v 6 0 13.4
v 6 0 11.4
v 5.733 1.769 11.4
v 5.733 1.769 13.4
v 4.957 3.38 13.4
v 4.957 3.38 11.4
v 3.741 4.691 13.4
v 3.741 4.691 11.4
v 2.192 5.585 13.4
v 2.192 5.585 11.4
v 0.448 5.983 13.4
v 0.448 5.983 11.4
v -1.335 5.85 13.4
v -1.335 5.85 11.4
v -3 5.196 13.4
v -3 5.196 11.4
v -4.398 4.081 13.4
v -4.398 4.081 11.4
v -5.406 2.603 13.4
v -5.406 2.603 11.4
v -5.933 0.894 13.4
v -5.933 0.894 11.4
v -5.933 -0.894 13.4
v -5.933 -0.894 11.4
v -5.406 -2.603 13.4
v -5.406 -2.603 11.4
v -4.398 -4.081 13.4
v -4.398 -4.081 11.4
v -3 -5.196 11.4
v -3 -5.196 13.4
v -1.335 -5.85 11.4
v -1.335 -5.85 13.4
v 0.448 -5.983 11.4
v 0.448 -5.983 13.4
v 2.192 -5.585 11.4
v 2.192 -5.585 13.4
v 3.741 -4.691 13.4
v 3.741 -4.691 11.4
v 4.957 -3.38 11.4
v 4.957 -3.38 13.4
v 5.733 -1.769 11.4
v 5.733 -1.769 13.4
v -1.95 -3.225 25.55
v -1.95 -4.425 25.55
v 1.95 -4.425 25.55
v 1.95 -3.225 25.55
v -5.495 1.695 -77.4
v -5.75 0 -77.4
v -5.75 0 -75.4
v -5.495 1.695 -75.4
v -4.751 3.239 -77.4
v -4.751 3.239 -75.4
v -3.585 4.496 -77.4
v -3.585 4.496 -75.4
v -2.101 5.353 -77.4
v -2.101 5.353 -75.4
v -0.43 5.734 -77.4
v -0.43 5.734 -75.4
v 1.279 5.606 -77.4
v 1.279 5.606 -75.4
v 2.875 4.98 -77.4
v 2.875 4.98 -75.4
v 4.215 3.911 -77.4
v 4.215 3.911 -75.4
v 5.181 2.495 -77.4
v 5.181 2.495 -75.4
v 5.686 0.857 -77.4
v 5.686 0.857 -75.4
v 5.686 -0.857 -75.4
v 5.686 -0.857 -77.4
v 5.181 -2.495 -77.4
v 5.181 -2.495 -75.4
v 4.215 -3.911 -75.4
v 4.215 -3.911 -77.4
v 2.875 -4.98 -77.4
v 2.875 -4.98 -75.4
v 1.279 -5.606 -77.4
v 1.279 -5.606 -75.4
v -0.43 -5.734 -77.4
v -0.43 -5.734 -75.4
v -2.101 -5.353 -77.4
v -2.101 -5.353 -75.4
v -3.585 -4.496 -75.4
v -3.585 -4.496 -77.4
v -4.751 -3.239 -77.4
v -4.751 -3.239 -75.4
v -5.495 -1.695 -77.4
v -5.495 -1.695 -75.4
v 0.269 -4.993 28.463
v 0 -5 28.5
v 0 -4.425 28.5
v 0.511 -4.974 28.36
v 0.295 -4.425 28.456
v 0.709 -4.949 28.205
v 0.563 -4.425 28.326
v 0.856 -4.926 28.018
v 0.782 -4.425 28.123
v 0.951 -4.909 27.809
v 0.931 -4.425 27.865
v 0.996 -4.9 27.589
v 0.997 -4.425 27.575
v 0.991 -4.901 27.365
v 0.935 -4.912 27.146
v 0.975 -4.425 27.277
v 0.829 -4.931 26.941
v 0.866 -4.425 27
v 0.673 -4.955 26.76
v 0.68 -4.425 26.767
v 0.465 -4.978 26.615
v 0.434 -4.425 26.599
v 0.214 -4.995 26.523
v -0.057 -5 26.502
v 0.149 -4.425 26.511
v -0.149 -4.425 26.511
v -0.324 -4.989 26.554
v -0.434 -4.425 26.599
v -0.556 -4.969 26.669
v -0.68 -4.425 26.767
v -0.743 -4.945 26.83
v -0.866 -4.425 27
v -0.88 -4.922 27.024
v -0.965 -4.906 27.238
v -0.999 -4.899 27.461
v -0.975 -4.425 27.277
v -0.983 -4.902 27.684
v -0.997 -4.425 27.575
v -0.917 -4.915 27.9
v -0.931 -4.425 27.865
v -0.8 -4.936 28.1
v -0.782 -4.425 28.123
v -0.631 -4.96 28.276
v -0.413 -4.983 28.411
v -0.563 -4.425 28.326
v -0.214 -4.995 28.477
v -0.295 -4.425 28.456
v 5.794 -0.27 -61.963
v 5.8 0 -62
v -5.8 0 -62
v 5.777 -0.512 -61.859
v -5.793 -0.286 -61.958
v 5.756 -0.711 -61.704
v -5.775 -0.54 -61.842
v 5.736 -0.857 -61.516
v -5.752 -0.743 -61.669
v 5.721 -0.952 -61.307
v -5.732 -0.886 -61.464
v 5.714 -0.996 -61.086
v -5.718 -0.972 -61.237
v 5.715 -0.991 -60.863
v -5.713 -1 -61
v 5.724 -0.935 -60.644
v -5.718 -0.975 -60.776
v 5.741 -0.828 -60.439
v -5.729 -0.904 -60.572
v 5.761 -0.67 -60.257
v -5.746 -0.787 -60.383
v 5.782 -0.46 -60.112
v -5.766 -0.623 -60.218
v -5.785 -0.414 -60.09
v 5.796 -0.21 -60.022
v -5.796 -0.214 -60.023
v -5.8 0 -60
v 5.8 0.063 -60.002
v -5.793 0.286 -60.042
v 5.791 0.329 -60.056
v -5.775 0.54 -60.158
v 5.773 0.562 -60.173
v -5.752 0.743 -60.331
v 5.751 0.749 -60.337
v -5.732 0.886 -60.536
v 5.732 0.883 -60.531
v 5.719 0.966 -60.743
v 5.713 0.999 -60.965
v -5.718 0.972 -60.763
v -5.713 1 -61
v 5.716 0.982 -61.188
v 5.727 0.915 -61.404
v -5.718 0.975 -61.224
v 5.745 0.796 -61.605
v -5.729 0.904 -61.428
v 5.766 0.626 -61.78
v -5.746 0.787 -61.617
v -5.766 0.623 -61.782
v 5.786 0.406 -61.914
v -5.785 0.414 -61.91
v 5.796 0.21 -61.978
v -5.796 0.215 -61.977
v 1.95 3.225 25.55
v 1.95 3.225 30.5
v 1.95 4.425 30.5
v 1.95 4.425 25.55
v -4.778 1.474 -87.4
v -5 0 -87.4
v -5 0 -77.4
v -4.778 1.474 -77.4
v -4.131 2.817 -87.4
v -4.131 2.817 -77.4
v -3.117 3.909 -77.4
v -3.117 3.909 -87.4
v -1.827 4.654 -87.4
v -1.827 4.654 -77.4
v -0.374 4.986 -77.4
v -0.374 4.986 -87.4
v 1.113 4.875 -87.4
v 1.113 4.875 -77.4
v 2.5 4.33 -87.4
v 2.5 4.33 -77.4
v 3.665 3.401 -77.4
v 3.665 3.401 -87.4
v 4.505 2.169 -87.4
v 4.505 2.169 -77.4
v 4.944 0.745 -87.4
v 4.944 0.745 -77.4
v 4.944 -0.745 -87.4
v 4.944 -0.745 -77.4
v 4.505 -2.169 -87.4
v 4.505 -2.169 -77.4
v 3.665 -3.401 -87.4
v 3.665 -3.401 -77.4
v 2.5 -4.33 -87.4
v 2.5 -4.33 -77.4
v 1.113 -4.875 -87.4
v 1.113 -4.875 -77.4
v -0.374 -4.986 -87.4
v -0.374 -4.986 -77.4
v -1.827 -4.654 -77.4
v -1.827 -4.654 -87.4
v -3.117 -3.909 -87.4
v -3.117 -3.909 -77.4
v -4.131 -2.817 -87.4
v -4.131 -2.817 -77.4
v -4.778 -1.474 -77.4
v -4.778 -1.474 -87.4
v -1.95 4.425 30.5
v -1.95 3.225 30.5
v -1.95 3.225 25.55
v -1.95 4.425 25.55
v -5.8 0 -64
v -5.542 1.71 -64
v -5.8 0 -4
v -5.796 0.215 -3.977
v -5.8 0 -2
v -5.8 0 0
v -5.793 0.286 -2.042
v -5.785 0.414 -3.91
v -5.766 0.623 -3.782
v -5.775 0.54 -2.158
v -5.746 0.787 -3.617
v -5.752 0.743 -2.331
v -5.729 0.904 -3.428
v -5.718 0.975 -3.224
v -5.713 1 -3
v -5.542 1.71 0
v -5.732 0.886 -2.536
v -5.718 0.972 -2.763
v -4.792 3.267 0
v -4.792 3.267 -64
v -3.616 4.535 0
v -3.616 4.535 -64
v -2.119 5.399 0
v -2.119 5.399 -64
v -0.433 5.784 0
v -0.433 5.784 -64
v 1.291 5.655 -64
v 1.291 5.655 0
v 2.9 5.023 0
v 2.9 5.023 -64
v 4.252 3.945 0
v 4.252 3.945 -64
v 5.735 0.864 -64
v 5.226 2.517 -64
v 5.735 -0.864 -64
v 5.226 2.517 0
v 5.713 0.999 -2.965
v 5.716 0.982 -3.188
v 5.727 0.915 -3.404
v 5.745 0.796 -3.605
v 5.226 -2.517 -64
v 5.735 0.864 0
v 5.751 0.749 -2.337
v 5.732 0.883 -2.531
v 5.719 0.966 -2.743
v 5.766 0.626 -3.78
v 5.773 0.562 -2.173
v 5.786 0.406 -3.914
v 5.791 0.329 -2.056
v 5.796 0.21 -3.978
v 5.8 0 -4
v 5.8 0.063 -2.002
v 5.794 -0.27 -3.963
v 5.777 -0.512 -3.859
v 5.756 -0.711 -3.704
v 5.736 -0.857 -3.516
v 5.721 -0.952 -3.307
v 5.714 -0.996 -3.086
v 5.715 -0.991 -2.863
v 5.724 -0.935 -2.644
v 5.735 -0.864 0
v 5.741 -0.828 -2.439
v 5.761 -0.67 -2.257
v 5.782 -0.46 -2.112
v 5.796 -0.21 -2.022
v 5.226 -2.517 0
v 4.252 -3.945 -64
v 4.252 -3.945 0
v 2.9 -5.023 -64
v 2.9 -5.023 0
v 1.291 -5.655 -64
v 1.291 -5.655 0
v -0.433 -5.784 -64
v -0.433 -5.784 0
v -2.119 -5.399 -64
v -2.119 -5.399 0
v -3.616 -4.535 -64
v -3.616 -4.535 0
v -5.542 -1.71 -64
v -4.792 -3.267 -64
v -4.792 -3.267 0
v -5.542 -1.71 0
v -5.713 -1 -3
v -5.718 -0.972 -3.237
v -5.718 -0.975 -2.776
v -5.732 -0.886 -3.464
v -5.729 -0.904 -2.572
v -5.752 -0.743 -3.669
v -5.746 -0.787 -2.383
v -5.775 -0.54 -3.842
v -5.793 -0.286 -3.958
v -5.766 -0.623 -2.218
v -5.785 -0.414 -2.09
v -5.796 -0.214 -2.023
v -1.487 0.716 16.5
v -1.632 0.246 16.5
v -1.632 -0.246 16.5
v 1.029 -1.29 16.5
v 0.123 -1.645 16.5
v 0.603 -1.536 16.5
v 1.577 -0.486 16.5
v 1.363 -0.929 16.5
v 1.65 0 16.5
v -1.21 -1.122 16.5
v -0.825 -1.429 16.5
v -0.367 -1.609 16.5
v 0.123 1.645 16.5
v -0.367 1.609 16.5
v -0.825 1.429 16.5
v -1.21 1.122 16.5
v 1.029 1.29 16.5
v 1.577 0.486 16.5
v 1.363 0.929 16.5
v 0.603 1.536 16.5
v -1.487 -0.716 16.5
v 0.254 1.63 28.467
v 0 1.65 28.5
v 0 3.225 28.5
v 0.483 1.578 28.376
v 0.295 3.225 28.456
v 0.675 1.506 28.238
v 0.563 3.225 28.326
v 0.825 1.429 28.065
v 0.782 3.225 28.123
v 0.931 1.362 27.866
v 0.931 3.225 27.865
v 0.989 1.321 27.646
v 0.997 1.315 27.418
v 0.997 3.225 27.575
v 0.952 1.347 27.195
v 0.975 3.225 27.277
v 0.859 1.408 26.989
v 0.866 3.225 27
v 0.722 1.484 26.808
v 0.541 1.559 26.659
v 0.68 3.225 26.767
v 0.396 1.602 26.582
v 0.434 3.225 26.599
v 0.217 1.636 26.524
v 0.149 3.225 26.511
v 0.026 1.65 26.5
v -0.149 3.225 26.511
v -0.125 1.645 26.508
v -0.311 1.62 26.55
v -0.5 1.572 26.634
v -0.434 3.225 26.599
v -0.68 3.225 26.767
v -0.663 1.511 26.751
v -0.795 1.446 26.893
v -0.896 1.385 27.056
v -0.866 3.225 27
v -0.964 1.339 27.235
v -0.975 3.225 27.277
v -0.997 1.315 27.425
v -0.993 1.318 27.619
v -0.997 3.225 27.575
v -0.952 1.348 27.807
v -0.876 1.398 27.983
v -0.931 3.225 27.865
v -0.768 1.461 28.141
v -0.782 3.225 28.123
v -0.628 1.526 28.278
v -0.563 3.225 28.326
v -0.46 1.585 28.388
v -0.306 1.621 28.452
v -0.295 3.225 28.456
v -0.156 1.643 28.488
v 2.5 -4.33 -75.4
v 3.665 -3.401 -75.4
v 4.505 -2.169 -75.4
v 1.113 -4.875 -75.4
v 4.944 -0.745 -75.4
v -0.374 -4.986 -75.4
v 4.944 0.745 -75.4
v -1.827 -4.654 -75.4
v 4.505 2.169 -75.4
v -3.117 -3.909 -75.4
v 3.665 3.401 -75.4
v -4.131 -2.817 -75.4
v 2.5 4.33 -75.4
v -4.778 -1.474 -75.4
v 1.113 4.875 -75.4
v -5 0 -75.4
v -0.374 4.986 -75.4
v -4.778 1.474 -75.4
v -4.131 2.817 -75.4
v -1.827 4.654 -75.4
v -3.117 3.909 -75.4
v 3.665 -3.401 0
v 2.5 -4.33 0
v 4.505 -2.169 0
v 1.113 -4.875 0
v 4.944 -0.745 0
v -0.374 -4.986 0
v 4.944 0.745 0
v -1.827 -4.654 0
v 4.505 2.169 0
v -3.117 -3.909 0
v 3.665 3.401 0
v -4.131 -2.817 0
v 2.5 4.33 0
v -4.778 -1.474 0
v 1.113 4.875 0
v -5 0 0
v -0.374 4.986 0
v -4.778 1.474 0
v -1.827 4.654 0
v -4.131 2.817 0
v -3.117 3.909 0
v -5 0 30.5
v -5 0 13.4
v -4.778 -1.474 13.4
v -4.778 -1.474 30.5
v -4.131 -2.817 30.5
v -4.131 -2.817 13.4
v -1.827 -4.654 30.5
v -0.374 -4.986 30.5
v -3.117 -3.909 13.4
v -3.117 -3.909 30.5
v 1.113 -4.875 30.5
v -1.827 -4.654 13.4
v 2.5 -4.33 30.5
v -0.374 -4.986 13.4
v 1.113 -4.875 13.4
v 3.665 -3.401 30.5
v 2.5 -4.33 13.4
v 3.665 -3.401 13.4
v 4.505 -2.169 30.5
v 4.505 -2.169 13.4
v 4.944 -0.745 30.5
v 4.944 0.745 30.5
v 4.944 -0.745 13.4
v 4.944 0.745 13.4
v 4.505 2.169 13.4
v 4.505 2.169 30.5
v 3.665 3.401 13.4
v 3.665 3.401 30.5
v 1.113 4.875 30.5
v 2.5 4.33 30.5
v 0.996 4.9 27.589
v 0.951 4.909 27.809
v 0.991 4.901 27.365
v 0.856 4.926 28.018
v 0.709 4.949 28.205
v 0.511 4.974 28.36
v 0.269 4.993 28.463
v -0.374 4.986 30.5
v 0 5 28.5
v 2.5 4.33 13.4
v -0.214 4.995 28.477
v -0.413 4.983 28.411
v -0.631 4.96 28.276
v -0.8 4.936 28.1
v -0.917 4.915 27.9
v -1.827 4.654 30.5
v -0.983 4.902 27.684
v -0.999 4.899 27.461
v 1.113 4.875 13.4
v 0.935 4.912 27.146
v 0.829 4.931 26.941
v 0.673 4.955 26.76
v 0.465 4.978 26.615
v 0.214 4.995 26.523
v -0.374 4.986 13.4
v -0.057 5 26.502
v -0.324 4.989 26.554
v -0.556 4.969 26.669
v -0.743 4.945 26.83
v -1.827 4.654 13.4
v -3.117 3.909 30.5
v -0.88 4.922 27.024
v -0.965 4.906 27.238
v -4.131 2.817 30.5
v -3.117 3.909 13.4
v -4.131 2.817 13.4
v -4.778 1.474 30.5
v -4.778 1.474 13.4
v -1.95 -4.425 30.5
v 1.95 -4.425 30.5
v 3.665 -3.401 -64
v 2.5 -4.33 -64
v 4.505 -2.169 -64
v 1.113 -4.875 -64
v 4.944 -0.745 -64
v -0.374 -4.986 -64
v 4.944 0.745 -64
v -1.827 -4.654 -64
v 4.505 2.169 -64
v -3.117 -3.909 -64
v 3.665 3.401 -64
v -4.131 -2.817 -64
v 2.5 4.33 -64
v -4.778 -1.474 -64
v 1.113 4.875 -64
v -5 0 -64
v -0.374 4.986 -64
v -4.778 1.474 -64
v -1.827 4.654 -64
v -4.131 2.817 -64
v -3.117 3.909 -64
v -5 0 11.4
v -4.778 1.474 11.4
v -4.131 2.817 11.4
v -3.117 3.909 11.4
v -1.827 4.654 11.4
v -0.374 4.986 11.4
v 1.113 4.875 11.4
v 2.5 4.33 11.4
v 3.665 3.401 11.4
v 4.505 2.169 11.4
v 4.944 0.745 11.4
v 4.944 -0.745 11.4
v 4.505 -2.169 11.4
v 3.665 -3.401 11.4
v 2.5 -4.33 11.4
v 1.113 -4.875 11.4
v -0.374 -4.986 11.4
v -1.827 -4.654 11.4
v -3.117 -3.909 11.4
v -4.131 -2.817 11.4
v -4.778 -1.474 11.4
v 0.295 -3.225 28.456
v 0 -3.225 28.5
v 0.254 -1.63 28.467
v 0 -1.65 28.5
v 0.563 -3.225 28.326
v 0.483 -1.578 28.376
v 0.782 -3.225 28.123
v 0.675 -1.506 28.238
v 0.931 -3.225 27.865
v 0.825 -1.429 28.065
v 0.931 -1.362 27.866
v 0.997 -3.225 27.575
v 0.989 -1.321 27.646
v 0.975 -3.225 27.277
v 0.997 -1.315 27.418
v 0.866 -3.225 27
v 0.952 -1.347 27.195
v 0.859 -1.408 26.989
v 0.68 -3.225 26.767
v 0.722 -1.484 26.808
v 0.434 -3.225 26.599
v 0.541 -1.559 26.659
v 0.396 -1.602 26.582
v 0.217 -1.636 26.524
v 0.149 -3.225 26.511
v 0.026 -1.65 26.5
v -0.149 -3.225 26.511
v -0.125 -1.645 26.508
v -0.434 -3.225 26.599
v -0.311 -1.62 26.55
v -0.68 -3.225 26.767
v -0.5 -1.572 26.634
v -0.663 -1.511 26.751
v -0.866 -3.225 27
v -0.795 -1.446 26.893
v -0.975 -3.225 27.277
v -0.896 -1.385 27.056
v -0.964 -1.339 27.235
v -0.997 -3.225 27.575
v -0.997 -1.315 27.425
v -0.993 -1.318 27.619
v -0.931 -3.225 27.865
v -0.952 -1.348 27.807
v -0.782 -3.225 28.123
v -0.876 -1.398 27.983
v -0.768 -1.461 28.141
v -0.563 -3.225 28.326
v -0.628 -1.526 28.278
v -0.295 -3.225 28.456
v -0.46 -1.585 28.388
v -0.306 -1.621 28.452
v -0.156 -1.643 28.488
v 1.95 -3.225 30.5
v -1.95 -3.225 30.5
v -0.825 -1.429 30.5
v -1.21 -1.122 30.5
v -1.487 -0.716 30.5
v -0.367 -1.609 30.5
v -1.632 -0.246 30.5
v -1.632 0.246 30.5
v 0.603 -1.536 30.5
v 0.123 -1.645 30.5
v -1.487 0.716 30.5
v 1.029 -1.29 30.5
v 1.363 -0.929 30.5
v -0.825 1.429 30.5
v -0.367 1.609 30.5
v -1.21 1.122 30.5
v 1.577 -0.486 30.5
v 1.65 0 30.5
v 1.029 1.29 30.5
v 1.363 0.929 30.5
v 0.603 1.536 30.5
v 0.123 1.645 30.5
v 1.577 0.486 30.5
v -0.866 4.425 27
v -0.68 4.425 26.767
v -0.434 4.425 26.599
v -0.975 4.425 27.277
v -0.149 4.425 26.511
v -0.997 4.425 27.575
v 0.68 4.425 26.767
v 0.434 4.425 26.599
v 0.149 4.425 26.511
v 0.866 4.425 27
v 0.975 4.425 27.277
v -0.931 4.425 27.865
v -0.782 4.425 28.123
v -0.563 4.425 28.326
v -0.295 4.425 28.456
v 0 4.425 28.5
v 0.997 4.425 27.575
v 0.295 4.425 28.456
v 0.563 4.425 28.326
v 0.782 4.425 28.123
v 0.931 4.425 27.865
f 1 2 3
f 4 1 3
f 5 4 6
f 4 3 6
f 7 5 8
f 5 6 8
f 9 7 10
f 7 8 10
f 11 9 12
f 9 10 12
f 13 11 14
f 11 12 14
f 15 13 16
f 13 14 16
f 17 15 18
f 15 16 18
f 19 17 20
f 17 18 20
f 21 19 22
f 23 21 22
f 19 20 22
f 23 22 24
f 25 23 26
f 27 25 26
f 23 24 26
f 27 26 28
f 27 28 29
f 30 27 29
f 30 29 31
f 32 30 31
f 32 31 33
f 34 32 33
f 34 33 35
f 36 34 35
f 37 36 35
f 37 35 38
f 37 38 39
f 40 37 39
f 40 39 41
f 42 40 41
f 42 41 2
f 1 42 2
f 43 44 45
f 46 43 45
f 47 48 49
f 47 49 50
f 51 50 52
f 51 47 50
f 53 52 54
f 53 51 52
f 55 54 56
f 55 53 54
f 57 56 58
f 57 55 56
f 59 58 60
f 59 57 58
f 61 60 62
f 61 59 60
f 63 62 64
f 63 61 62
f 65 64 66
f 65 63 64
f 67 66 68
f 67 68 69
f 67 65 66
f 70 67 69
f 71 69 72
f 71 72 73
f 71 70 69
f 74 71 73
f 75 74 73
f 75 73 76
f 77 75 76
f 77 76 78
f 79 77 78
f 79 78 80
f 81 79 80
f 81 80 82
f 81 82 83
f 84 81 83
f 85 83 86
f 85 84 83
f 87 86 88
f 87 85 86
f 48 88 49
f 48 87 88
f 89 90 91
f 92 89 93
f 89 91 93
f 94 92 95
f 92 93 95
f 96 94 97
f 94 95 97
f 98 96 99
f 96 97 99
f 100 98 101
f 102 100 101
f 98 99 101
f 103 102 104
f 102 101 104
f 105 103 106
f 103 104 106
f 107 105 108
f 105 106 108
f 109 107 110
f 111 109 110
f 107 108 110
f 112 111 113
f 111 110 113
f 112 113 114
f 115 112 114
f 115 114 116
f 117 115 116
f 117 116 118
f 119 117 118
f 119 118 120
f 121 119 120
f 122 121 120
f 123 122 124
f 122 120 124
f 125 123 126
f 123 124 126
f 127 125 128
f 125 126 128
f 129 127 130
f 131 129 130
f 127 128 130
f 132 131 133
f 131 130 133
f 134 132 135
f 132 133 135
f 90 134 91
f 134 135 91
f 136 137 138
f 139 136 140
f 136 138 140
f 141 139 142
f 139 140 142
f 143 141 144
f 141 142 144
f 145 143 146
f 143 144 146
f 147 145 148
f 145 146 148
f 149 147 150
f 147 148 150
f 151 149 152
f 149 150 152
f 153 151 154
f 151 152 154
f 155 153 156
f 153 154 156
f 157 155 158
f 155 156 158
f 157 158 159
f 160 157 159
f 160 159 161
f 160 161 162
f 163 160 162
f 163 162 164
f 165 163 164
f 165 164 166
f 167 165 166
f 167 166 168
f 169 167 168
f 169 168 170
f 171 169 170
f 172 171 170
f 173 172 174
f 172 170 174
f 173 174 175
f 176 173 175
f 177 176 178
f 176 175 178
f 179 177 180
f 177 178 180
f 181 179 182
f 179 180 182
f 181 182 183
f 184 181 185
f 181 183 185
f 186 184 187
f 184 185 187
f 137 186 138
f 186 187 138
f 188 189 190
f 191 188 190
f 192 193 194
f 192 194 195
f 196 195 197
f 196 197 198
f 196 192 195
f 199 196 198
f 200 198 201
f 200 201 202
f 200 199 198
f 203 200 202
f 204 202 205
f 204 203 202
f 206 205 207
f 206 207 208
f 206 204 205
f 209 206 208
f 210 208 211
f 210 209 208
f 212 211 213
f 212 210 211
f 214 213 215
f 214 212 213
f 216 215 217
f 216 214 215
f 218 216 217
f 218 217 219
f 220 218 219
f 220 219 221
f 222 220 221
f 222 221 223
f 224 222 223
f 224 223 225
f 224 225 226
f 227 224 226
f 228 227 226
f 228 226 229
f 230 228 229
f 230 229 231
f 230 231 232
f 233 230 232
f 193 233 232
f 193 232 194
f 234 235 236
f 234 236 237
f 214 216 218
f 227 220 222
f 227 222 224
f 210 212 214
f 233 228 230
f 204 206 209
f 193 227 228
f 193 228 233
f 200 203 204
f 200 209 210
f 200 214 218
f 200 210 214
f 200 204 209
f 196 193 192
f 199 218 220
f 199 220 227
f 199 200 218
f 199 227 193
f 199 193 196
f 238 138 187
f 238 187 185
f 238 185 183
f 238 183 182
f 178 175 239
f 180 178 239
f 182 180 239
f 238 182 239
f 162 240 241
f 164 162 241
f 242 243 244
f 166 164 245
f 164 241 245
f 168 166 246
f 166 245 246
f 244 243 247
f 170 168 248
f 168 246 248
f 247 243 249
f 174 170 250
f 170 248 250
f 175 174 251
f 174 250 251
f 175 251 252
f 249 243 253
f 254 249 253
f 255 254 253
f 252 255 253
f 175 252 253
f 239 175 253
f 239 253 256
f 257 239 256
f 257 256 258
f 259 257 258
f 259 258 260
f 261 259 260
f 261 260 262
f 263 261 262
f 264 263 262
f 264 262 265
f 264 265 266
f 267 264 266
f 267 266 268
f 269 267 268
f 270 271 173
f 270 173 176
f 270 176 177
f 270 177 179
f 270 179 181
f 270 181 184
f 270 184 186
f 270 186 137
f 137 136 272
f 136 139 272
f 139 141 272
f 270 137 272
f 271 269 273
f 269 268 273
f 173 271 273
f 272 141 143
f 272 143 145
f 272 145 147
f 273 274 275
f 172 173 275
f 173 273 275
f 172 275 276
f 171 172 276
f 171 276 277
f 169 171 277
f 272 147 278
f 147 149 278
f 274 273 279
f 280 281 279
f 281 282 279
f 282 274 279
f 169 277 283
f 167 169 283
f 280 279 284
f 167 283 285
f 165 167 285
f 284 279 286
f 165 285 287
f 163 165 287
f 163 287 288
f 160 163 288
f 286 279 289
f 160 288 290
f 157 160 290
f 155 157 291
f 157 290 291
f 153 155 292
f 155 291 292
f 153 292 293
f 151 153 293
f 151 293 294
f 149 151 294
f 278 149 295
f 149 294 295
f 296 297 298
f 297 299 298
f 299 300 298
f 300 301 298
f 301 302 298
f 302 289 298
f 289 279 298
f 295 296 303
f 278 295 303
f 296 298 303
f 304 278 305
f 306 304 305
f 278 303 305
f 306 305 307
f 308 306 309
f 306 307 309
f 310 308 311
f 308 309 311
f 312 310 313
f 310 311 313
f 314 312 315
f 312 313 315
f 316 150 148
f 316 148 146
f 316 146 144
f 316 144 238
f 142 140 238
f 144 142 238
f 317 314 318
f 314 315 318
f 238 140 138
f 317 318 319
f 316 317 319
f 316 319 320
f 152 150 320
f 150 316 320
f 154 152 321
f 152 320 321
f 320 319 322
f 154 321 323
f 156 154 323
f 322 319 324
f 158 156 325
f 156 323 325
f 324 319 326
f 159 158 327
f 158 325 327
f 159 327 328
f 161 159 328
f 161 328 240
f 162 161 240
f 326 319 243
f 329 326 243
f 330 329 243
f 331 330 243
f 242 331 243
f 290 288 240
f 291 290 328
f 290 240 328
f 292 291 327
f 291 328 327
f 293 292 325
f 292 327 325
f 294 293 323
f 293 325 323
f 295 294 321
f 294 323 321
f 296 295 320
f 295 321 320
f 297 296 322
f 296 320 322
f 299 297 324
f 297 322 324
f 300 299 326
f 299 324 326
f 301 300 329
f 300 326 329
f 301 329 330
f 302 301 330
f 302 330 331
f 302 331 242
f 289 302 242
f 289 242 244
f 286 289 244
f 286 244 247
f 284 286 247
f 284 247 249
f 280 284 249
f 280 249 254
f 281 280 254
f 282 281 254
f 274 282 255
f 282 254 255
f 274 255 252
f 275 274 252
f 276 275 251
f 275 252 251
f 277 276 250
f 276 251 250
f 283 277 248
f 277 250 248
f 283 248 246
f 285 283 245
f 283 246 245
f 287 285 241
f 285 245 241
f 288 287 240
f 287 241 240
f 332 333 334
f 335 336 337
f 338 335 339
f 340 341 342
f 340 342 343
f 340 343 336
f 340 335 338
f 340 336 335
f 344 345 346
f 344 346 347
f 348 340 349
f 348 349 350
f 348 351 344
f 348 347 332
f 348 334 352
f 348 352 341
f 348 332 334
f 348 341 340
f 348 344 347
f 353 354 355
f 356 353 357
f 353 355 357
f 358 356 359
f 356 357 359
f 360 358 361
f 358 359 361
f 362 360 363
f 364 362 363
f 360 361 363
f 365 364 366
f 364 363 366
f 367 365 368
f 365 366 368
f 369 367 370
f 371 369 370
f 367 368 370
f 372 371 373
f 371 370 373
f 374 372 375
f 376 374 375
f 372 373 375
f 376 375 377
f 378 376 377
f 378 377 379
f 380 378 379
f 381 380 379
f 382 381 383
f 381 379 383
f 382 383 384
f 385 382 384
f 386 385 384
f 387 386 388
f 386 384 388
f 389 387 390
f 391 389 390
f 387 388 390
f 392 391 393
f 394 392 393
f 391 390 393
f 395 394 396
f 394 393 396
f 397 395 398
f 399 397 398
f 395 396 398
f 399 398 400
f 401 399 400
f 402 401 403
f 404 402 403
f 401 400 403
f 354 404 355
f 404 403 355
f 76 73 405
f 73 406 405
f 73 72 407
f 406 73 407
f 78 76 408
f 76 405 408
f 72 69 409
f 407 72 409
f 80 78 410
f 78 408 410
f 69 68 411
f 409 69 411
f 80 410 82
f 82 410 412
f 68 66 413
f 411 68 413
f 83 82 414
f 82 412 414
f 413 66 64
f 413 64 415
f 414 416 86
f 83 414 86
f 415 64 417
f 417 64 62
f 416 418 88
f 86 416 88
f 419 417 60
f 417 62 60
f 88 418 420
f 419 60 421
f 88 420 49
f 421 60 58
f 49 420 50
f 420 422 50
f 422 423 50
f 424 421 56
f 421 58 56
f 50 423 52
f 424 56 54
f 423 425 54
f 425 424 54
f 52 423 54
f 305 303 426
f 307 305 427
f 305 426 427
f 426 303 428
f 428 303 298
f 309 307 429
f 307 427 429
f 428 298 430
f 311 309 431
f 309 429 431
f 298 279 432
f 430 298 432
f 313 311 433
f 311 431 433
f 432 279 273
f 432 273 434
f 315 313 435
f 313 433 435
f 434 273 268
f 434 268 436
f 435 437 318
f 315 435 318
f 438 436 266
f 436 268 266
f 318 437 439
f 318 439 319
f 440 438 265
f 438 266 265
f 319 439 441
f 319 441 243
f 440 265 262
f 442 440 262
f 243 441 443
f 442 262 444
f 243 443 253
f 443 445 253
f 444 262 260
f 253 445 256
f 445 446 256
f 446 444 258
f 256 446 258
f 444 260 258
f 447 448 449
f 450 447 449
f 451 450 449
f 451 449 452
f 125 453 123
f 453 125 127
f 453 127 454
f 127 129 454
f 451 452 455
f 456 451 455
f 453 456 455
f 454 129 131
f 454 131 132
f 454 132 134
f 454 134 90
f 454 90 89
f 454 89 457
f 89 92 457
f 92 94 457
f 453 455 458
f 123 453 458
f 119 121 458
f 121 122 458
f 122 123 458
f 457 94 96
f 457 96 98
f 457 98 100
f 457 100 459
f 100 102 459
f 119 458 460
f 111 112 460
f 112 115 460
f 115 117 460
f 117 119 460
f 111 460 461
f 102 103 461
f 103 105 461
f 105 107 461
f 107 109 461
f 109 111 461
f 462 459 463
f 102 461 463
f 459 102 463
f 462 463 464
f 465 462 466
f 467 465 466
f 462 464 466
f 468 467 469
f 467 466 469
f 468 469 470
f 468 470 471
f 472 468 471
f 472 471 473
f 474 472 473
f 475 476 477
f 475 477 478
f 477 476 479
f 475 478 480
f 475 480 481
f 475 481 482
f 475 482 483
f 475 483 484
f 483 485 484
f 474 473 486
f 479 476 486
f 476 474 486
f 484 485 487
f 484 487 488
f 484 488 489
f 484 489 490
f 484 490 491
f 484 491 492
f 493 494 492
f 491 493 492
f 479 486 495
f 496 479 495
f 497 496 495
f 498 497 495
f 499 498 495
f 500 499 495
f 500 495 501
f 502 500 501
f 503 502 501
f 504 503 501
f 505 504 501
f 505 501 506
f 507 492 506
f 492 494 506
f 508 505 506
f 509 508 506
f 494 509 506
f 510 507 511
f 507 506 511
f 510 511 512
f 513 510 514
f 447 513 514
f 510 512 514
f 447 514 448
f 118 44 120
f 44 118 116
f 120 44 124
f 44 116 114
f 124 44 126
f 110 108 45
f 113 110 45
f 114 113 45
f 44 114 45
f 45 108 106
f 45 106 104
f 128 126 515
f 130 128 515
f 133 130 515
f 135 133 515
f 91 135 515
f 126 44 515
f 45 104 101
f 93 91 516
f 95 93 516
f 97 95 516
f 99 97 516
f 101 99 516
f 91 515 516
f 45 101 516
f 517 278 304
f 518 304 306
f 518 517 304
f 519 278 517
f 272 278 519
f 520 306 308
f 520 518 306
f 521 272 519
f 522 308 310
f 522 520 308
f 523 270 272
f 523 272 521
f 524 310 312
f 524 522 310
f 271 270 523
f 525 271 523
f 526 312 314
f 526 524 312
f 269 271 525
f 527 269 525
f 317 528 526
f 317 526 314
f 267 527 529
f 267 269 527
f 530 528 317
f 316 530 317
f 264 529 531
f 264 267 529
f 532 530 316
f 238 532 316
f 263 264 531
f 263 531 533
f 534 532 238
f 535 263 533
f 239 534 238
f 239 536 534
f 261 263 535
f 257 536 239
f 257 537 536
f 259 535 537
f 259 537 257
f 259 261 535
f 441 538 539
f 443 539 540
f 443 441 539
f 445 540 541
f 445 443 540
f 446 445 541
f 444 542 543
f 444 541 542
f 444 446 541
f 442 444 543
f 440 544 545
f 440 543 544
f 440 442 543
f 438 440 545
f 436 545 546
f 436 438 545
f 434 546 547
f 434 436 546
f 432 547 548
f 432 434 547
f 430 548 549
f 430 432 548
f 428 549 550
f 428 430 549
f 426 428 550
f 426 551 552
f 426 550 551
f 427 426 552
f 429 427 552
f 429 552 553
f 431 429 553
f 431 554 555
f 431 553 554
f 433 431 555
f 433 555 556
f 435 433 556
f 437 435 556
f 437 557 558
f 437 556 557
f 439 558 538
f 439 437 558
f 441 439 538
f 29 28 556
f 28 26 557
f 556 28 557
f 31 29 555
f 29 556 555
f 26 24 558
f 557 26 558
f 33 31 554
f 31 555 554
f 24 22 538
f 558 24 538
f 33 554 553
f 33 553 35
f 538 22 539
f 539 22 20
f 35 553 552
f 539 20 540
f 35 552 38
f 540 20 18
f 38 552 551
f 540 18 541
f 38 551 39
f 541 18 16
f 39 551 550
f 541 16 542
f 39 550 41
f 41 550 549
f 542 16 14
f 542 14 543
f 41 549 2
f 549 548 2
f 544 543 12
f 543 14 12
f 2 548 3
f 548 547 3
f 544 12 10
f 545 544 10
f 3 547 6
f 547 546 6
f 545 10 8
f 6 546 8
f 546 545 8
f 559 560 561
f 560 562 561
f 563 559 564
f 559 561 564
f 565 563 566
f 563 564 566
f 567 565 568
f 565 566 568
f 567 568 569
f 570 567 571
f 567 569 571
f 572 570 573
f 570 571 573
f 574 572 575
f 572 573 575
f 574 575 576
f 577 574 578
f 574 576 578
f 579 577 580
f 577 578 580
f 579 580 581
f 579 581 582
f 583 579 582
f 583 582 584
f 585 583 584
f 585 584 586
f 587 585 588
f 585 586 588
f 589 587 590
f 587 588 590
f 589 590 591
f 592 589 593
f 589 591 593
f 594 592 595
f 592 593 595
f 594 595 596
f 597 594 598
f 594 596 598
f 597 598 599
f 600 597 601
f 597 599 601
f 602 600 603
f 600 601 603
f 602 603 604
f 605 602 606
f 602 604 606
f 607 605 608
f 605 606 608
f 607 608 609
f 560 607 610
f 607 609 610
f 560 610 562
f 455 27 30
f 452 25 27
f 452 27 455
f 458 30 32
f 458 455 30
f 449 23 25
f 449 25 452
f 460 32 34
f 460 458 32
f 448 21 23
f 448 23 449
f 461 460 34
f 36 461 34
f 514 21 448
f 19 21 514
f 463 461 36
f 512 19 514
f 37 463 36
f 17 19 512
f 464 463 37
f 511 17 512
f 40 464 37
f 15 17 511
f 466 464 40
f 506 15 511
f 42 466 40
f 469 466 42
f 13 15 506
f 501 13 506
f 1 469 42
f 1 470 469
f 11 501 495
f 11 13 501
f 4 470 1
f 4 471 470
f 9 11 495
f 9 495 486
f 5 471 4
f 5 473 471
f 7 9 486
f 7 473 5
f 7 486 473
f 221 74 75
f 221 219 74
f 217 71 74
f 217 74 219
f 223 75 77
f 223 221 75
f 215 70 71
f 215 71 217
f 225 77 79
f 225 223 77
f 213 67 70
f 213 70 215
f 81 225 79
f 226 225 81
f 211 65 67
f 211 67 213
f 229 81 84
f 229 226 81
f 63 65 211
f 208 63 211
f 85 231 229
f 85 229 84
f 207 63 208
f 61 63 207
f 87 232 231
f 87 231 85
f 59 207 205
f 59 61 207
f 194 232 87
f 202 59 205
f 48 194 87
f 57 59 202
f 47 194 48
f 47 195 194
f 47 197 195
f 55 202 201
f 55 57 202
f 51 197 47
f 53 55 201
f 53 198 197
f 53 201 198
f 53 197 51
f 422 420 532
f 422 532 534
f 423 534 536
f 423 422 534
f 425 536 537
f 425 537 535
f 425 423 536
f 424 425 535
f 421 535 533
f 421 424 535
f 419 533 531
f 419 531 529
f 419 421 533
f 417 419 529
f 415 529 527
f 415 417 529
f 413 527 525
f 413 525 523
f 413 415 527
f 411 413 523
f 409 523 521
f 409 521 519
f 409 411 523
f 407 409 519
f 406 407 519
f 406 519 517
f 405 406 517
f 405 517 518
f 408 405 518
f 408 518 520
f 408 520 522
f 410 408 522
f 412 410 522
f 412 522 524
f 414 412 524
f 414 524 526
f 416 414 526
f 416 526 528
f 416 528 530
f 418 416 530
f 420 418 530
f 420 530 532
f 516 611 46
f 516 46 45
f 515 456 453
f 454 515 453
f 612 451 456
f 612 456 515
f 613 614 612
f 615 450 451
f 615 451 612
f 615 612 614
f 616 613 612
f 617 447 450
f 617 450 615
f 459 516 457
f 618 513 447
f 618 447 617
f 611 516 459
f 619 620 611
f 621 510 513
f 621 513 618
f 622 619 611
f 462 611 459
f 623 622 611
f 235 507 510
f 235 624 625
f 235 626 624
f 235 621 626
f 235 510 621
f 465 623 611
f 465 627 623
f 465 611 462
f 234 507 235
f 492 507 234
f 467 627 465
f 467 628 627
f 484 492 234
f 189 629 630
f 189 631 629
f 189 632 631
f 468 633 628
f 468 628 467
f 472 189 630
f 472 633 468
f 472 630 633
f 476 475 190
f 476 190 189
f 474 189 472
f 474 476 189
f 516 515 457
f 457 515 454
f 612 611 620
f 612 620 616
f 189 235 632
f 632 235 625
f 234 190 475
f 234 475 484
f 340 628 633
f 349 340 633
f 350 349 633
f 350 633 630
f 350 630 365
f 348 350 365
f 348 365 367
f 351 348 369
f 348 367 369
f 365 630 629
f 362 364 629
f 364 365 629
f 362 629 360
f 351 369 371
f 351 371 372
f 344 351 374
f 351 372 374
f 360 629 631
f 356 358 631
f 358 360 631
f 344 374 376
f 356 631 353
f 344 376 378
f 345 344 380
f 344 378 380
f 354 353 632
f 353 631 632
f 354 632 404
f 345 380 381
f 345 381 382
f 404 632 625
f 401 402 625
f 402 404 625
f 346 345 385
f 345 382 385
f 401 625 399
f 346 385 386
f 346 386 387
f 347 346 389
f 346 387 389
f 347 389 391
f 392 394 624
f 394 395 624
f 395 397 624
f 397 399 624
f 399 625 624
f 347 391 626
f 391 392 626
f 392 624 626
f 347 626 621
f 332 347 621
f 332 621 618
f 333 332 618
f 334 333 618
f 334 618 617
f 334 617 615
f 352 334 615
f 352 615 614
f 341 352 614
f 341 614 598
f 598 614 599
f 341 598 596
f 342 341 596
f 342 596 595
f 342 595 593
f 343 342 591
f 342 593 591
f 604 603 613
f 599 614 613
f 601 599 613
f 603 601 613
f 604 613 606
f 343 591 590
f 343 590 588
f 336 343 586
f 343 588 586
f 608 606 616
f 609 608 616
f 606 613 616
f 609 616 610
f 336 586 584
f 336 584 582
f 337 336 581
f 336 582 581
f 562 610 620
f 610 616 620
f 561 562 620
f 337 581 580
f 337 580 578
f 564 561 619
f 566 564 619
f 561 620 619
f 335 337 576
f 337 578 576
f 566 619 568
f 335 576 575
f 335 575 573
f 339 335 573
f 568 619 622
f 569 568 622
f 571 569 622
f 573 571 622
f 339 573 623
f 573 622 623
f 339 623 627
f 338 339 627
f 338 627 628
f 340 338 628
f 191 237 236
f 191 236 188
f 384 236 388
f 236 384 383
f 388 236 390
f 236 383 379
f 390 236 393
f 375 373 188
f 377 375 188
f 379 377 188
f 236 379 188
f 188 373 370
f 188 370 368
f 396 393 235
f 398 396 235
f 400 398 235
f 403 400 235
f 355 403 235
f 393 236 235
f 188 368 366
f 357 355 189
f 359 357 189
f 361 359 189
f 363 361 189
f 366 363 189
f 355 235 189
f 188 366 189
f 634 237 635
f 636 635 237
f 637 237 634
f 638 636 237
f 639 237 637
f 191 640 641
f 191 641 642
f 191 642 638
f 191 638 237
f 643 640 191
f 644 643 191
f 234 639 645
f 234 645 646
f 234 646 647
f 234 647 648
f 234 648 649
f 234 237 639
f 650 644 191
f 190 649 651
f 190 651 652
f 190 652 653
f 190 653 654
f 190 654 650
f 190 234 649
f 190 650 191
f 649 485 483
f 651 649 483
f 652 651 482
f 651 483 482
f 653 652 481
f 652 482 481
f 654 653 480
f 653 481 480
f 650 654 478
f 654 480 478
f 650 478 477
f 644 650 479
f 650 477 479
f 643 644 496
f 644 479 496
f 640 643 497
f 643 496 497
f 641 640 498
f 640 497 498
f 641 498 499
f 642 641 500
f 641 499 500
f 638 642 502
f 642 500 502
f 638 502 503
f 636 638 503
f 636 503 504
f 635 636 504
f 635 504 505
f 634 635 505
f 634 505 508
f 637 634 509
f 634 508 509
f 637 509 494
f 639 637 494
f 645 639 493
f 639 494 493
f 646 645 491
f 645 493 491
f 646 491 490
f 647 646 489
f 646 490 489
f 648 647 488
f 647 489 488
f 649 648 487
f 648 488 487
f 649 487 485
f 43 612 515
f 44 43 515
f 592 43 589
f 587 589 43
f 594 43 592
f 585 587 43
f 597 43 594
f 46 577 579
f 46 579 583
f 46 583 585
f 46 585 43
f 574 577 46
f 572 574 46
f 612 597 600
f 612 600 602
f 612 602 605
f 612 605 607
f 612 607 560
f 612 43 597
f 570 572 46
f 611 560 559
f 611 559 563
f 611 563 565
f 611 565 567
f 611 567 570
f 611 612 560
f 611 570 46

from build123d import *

# Parameters (mm, degrees)
SKETCH1_R           = 6
BOSS_EXTRUDE1_DEPTH = 30.5
SKETCH2_R           = 1.65
CUT_EXTRUDE1_DEPTH  = 14
SKETCH13_W          = 3.9
SKETCH13_H          = 1.2
CUT_EXTRUDE6_DEPTH  = 4.95
SKETCH4_R           = 1
CUT_EXTRUDE7_DEPTH  = 7.5
SKETCH19_R          = 6
SKETCH19_R_2        = 5
CUT_EXTRUDE8_DEPTH  = 45
SKETCH21_R          = 5.8
BOSS_EXTRUDE2_DEPTH = 64
BOSS_EXTRUDE3_START = 13.4
SKETCH22_R          = 5
BOSS_EXTRUDE3_DEPTH = 13.4
BOSS_EXTRUDE5_START = 10
SKETCH24_R          = 5
BOSS_EXTRUDE5_DEPTH = 10
BOSS_EXTRUDE6_START = -19.1
SKETCH25_R          = 6
SKETCH25_R_2        = 5
BOSS_EXTRUDE6_DEPTH = 19.1
CUT_EXTRUDE9_START  = -17.1
SKETCH26_R          = 6
SKETCH26_R_2        = 5
CUT_EXTRUDE9_DEPTH  = 17.1
SKETCH28_R          = 1
CUT_EXTRUDE11_DEPTH = 17
SKETCH23_R          = 5.75
BOSS_EXTRUDE7_DEPTH = 2


with BuildPart() as part:
    # Sketch1 → Boss-Extrude1 (new body)
    with BuildSketch(Plane.XY):
        with Locations(Location((0, 0, 0), (0, 0, 180))):
            Circle(SKETCH1_R)
    extrude(amount=BOSS_EXTRUDE1_DEPTH)

    # Sketch2 → Cut-Extrude1 (cut)
    with BuildSketch(Plane.XY.offset(30.5)):
        Circle(SKETCH2_R)
    extrude(amount=-CUT_EXTRUDE1_DEPTH, mode=Mode.SUBTRACT)

    # Sketch13 → Cut-Extrude6 (cut)
    with BuildSketch(Plane.XY.offset(30.5)):
        with Locations((0, 3.825)):
            Rectangle(SKETCH13_W, SKETCH13_H)
    cut_extrude6 = extrude(amount=-CUT_EXTRUDE6_DEPTH, mode=Mode.SUBTRACT)

    # Sketch4 → Cut-Extrude7 (cut, symmetric)
    with BuildSketch(Plane(origin=(0, 0, 0), x_dir=(1, 0, 0), z_dir=(0, 1, 0))):
        with Locations(Location((0, -27.5, 0), (0, 0, 270))):
            Circle(SKETCH4_R)
    extrude(amount=CUT_EXTRUDE7_DEPTH, both=True, mode=Mode.SUBTRACT)

    # Mirror1: Cut-Extrude6 across plane
    add(cut_extrude6.mirror(Plane.ZX), mode=Mode.SUBTRACT)

    # Sketch19 → Cut-Extrude8 (cut)
    with BuildSketch(Plane(origin=(0, 0, 0), x_dir=(-1, 0, 0), z_dir=(0, 0, -1))):
        Circle(SKETCH19_R)
        Circle(SKETCH19_R_2, mode=Mode.SUBTRACT)
    extrude(amount=-CUT_EXTRUDE8_DEPTH, mode=Mode.SUBTRACT)

    # Sketch21 → Boss-Extrude2 (add)
    with BuildSketch(Plane(origin=(0, 0, 0), x_dir=(-1, 0, 0), z_dir=(0, 0, -1))):
        Circle(SKETCH21_R)
    extrude(amount=BOSS_EXTRUDE2_DEPTH)

    # Sketch22 → Boss-Extrude3 (add)
    with BuildSketch(Plane(origin=(0, 0, -64), x_dir=(-1, 0, 0), z_dir=(0, 0, -1)).offset(BOSS_EXTRUDE3_START)):
        Circle(SKETCH22_R)
    extrude(amount=-BOSS_EXTRUDE3_DEPTH)

    # Sketch24 → Boss-Extrude5 (add)
    with BuildSketch(Plane(origin=(0, 0, -77.4), x_dir=(-1, 0, 0), z_dir=(0, 0, -1)).offset(BOSS_EXTRUDE5_START)):
        Circle(SKETCH24_R)
    extrude(amount=-BOSS_EXTRUDE5_DEPTH)

    # Sketch25 → Boss-Extrude6 (add)
    with BuildSketch(Plane.XY.offset(30.5).offset(BOSS_EXTRUDE6_START)):
        Circle(SKETCH25_R)
        with Locations(Location((0, 0, 0), (0, 0, 180))):
            Circle(SKETCH25_R_2, mode=Mode.SUBTRACT)
    extrude(amount=BOSS_EXTRUDE6_DEPTH)

    # Sketch26 → Cut-Extrude9 (cut)
    with BuildSketch(Plane.XY.offset(30.5).offset(CUT_EXTRUDE9_START)):
        Circle(SKETCH26_R)
        with Locations(Location((0, 0, 0), (0, 0, 180))):
            Circle(SKETCH26_R_2, mode=Mode.SUBTRACT)
    extrude(amount=CUT_EXTRUDE9_DEPTH, mode=Mode.SUBTRACT)

    # Sketch28 → Cut-Extrude11 (cut)
    with BuildSketch(Plane.ZY.offset(5.8)):
        with Locations(Location((-61, 0, 0), (0, 0, 180))):
            Circle(SKETCH28_R)
        with Locations(Location((-3, 0, 0), (0, 0, 180))):
            Circle(SKETCH28_R)
    extrude(amount=-CUT_EXTRUDE11_DEPTH, mode=Mode.SUBTRACT)

    # Sketch23 → Boss-Extrude7 (add)
    with BuildSketch(Plane(origin=(0, 0, -77.4), x_dir=(-1, 0, 0), z_dir=(0, 0, -1))):
        Circle(SKETCH23_R)
    extrude(amount=-BOSS_EXTRUDE7_DEPTH)


solid = part.part
